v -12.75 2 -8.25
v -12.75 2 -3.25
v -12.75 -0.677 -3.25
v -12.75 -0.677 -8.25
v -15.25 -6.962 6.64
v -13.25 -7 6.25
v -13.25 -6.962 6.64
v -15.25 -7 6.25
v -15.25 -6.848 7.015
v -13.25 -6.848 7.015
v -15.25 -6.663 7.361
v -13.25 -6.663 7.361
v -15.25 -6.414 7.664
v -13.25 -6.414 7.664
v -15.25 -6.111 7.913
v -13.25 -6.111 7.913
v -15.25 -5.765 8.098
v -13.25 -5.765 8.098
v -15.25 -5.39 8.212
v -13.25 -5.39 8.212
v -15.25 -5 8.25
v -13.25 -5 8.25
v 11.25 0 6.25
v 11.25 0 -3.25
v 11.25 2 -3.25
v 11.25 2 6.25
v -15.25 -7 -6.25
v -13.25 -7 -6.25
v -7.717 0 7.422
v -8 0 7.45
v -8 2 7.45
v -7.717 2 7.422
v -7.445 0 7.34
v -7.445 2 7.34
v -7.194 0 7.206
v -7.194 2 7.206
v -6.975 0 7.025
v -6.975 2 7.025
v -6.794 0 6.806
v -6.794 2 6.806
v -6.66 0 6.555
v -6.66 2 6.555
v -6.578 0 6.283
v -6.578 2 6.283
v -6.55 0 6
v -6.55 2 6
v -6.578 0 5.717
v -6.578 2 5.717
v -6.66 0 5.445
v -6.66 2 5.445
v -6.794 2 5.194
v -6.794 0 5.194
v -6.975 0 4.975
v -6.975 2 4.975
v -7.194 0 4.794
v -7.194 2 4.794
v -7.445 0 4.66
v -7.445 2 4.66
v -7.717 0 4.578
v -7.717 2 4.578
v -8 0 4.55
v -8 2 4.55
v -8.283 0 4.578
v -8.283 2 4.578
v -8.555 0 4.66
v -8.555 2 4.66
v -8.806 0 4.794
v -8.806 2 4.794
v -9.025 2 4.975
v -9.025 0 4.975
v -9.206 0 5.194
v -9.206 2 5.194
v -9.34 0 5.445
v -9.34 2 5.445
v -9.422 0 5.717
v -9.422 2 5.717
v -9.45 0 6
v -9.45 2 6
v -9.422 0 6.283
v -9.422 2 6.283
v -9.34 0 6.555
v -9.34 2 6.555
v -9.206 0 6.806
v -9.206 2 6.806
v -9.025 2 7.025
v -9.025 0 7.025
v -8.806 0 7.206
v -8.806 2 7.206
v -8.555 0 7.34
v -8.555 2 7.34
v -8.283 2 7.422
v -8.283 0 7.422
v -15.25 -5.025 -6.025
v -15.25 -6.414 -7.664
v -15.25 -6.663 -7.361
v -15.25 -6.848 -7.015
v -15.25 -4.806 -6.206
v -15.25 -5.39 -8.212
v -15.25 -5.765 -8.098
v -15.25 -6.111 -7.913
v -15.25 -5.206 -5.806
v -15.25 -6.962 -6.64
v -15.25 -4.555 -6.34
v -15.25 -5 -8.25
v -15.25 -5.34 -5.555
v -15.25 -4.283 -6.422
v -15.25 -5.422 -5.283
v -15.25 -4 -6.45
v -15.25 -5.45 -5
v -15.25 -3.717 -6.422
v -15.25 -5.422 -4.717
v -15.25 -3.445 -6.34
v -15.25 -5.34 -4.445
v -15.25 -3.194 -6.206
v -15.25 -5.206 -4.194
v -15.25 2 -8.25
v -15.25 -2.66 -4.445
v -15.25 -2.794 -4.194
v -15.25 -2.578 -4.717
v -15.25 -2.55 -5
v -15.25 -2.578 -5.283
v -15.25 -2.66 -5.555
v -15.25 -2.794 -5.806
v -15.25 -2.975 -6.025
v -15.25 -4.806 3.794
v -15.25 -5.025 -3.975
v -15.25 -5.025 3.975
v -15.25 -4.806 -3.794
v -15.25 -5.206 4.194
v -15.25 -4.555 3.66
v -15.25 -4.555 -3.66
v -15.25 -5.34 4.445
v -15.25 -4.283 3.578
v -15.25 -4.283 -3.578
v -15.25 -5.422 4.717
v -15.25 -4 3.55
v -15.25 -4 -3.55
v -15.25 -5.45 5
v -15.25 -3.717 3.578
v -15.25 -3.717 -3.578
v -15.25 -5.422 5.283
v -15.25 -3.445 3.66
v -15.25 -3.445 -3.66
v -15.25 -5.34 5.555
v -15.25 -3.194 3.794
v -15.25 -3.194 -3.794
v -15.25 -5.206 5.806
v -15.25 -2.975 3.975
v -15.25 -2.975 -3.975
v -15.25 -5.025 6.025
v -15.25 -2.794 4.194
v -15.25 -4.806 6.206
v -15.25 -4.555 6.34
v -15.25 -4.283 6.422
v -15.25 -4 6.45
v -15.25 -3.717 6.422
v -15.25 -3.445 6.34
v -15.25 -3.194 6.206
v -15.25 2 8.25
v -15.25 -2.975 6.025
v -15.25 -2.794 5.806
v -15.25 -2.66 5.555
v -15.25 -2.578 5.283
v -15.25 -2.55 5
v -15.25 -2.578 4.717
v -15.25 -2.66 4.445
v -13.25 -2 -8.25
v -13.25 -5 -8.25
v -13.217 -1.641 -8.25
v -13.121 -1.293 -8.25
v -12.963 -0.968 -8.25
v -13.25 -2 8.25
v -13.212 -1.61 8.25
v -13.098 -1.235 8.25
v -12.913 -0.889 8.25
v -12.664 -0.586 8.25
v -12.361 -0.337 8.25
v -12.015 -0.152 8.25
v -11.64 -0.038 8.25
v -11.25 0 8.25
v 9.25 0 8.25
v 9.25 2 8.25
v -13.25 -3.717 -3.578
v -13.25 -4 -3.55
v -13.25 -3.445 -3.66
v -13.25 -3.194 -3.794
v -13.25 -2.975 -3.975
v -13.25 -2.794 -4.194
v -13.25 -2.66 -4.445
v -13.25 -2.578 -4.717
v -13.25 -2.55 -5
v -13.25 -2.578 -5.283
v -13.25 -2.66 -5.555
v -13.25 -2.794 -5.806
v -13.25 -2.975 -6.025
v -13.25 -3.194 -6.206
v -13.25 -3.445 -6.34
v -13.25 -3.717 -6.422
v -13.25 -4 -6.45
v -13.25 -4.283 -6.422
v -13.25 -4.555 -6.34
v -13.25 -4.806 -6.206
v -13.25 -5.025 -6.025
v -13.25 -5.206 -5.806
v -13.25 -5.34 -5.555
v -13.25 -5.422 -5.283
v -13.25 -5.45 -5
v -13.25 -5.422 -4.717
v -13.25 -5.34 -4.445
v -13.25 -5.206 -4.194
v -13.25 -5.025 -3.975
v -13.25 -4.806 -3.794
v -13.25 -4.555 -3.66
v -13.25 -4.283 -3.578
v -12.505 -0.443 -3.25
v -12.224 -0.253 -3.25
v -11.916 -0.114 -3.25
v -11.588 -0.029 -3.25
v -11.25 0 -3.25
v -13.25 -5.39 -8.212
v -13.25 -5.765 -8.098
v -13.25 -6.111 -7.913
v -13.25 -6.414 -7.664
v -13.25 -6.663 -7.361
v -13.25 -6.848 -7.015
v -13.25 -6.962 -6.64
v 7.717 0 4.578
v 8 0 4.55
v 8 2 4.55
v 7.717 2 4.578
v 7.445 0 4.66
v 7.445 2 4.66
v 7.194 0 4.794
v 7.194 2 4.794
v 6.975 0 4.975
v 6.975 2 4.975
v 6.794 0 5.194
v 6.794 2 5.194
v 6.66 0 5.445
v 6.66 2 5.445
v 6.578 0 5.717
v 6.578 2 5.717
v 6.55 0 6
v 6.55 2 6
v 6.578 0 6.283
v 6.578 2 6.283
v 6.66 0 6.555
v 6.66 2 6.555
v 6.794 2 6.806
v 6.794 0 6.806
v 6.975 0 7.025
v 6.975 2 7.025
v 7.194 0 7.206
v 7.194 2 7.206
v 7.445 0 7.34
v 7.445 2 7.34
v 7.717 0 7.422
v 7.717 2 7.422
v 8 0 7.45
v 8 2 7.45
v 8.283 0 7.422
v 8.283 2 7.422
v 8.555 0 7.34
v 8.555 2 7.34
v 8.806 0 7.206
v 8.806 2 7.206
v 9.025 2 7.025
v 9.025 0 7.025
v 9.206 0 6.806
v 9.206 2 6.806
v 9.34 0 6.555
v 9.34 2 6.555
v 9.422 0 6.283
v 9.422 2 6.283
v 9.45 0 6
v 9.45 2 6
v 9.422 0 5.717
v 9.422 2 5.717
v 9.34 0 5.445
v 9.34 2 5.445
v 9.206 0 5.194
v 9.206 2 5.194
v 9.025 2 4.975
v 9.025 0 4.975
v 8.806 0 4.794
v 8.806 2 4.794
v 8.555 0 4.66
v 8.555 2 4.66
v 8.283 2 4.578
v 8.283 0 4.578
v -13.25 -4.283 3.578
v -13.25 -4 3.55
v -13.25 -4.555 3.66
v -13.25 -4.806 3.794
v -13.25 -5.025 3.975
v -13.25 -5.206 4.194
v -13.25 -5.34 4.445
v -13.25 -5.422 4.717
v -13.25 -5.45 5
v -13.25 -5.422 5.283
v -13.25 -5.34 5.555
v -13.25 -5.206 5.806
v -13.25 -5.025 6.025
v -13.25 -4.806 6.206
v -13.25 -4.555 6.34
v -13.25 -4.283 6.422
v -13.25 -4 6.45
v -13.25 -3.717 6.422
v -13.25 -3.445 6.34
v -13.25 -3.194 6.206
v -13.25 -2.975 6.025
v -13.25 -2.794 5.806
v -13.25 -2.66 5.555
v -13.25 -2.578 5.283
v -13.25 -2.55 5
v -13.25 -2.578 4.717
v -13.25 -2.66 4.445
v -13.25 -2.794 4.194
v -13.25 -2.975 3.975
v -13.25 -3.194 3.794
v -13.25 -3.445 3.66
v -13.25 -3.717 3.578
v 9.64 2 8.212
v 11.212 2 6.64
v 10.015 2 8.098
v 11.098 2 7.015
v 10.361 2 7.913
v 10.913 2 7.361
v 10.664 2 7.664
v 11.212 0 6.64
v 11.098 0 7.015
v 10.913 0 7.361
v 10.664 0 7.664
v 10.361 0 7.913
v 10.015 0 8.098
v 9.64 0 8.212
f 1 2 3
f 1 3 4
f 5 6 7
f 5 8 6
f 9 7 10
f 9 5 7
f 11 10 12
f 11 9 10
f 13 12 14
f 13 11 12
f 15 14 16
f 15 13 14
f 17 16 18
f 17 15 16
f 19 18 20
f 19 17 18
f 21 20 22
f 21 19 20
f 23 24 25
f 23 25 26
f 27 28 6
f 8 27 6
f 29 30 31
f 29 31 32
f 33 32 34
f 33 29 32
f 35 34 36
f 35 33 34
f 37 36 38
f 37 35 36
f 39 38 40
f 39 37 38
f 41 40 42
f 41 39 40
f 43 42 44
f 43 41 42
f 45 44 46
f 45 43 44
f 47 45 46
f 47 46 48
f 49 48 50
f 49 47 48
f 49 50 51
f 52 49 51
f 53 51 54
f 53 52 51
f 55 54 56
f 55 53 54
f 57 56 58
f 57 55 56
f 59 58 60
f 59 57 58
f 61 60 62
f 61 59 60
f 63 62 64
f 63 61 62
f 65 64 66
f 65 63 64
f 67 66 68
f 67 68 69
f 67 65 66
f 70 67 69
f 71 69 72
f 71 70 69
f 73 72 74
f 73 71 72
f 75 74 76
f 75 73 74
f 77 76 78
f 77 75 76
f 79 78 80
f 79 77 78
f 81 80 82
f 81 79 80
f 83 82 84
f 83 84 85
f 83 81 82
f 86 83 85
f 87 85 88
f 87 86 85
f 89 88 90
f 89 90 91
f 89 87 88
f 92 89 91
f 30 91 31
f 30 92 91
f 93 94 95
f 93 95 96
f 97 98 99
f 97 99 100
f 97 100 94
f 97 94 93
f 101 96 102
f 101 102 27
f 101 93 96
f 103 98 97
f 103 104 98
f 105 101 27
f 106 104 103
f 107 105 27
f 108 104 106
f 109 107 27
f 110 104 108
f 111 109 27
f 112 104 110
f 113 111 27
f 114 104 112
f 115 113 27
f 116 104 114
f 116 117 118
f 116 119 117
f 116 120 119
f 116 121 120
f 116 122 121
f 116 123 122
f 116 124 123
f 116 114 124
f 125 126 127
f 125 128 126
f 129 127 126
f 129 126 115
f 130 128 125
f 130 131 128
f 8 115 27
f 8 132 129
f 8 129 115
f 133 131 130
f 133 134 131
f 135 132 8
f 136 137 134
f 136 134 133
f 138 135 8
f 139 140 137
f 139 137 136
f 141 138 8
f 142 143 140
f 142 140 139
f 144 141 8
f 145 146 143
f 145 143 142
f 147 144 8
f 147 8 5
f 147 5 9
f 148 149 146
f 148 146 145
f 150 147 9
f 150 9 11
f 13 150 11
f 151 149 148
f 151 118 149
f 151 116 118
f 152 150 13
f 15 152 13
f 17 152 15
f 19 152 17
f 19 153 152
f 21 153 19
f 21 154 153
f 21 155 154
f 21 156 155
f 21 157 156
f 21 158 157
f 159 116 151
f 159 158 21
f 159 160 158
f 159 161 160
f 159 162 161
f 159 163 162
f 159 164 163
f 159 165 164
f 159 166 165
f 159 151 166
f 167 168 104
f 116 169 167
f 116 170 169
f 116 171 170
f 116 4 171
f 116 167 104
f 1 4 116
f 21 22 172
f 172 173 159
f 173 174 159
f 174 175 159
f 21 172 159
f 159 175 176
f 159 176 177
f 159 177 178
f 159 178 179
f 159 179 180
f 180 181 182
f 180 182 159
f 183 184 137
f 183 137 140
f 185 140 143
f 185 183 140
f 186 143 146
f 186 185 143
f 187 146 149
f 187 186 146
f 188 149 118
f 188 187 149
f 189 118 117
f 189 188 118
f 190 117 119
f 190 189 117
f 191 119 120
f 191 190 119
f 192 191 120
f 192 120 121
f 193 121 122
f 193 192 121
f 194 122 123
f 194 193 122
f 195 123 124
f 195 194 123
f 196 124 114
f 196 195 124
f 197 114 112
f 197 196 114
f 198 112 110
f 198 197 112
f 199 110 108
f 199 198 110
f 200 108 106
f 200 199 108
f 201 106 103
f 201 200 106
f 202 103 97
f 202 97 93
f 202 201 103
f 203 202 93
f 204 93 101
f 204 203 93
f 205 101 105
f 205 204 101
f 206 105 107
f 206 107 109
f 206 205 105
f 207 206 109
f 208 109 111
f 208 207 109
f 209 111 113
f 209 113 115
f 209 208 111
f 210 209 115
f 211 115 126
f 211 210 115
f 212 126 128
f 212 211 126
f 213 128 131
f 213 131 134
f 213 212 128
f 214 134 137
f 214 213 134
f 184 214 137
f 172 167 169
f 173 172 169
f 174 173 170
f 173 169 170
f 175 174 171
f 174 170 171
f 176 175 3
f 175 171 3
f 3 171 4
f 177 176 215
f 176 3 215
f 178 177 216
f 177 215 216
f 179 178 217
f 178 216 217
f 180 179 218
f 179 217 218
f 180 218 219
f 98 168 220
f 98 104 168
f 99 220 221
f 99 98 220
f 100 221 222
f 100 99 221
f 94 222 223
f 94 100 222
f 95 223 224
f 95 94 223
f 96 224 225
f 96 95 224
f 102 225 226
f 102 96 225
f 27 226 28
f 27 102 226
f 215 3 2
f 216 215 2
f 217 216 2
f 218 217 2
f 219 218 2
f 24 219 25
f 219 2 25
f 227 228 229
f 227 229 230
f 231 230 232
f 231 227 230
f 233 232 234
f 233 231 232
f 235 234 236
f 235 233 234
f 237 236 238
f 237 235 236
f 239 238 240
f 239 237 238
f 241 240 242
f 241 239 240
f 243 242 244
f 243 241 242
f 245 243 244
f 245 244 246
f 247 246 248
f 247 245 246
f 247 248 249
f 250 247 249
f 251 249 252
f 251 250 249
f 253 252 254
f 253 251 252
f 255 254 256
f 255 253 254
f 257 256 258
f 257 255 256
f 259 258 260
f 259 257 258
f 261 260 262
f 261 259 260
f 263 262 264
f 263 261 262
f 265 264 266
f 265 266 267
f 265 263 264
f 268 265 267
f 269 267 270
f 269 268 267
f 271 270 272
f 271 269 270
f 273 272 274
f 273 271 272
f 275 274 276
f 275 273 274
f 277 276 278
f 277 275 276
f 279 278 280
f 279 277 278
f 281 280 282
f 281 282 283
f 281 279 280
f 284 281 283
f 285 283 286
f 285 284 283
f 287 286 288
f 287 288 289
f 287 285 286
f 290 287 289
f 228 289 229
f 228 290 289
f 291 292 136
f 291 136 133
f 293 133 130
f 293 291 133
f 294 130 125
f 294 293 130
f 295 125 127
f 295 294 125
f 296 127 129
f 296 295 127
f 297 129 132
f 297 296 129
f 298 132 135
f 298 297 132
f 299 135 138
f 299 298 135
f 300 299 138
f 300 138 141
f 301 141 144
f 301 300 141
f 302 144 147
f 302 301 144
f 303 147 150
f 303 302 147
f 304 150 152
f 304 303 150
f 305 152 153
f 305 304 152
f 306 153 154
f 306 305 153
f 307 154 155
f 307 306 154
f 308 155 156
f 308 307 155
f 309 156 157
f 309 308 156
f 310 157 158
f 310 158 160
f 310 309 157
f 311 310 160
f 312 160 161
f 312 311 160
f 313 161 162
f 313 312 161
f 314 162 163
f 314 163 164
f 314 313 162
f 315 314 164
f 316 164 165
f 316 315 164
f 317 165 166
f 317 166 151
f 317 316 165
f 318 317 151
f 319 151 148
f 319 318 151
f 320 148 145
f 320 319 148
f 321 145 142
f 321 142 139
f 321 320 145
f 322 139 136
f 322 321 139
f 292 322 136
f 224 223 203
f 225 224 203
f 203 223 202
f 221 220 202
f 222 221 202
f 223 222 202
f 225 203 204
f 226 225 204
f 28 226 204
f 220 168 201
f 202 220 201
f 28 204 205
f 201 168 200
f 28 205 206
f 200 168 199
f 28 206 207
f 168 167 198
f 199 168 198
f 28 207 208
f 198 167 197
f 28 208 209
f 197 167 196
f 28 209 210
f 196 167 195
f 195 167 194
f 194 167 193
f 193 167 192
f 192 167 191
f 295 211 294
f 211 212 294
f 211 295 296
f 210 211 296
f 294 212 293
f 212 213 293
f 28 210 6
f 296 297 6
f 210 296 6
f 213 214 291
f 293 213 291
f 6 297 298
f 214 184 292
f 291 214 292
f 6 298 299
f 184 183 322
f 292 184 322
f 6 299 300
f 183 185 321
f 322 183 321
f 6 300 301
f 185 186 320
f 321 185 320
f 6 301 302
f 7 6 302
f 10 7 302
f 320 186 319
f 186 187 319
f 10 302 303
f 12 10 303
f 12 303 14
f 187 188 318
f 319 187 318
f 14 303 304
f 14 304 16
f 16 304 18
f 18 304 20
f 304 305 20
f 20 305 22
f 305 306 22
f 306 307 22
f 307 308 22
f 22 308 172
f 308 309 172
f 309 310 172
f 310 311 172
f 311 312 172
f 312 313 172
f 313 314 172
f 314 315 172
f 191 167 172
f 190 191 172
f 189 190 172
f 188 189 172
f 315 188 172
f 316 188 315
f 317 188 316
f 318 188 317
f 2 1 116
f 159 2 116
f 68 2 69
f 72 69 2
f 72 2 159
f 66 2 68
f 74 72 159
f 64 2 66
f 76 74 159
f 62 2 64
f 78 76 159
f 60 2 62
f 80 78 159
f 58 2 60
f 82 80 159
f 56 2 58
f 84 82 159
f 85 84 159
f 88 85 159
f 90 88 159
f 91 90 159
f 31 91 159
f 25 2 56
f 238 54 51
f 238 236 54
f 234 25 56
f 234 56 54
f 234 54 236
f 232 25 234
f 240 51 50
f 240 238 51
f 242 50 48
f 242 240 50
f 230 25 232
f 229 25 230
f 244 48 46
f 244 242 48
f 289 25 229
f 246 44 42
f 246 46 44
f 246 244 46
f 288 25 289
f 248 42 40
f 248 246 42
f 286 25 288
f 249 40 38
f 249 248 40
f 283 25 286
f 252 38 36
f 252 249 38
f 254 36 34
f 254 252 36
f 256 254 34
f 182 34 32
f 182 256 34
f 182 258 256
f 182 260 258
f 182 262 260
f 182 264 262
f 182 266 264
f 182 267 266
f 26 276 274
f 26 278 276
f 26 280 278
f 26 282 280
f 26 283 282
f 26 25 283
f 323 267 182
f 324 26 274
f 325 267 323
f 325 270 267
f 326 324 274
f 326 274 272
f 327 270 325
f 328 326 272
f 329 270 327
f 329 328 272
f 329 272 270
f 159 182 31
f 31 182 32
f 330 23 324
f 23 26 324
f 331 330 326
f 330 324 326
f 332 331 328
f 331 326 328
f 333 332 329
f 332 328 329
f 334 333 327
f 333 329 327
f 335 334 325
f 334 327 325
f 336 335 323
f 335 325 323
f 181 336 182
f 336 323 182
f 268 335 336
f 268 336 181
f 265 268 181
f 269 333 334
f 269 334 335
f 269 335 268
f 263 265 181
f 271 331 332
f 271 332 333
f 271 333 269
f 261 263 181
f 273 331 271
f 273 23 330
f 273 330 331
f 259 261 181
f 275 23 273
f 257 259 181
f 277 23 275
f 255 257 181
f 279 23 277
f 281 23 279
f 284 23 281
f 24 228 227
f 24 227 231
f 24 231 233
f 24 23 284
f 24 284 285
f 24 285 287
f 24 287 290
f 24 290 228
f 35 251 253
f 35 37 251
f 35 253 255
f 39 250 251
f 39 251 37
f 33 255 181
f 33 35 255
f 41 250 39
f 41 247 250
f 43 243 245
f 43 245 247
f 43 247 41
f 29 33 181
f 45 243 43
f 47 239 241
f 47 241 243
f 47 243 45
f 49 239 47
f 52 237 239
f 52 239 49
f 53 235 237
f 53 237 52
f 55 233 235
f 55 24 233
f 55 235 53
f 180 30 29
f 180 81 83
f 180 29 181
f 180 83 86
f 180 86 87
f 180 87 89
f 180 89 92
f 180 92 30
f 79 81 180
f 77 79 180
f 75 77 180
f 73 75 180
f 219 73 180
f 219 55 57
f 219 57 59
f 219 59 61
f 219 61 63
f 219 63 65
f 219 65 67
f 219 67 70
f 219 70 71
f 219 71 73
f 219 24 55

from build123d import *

# Parameters (mm, degrees)
CROQUIS2_R              = 1.45
SALIENTE_EXTRUIR1_DEPTH = 2
CROQUIS3_W              = 16.5
CROQUIS3_H              = 9
CROQUIS3_R              = 1.45
SALIENTE_EXTRUIR2_DEPTH = 2
REDONDEO1_R             = 2
REDONDEO2_R             = 2
CROQUIS4_W              = 24
CROQUIS4_H              = 5
CORTAR_EXTRUIR1_DEPTH   = 20.535224596


with BuildPart() as part:
    # Croquis2 → Saliente-Extruir1 (new body)
    with BuildSketch(Plane(origin=(0, 0, 0), x_dir=(1, 0, 0), z_dir=(0, 1, 0))):
        Polygon((-11.25, 8.25), (11.25, 8.25), (11.25, -8.25), (-11.25, -8.25), (-13.25, -8.25), (-13.25, 8.25), align=None)
        with Locations(Location((-8, -6, 0), (0, 0, 270))):
            Circle(CROQUIS2_R, mode=Mode.SUBTRACT)
        with Locations(Location((8, -6, 0), (0, 0, 90))):
            Circle(CROQUIS2_R, mode=Mode.SUBTRACT)
    extrude(amount=SALIENTE_EXTRUIR1_DEPTH)

    # Croquis3 → Saliente-Extruir2 (add)
    with BuildSketch(Plane.ZY.offset(13.25)):
        with Locations((0, -2.5)):
            Rectangle(CROQUIS3_W, CROQUIS3_H)
        with Locations((-5, -4)):
            Circle(CROQUIS3_R, mode=Mode.SUBTRACT)
        with Locations(Location((5, -4, 0), (0, 0, 180))):
            Circle(CROQUIS3_R, mode=Mode.SUBTRACT)
    extrude(amount=SALIENTE_EXTRUIR2_DEPTH)

    # Redondeo1
    redondeo1_edges = [part.edges().sort_by_distance(p)[0] for p in [
        (-13.25, 0, 0),
    ]]
    fillet(redondeo1_edges, radius=REDONDEO1_R)

    # Redondeo2
    redondeo2_edges = [part.edges().sort_by_distance(p)[0] for p in [
        (11.25, 1, 8.25),
        (11.25, 1, -8.25),
        (-14.25, -7, -8.25),
        (-14.25, -7, 8.25),
    ]]
    fillet(redondeo2_edges, radius=REDONDEO2_R)

    # Croquis4 → Cortar-Extruir1 (cut, through all)
    with BuildSketch(Plane(origin=(0, 2, 0), x_dir=(1, 0, 0), z_dir=(0, 1, 0))):
        with Locations((-0.75, 5.75)):
            Rectangle(CROQUIS4_W, CROQUIS4_H)
    extrude(amount=-CORTAR_EXTRUIR1_DEPTH, mode=Mode.SUBTRACT)


solid = part.part
